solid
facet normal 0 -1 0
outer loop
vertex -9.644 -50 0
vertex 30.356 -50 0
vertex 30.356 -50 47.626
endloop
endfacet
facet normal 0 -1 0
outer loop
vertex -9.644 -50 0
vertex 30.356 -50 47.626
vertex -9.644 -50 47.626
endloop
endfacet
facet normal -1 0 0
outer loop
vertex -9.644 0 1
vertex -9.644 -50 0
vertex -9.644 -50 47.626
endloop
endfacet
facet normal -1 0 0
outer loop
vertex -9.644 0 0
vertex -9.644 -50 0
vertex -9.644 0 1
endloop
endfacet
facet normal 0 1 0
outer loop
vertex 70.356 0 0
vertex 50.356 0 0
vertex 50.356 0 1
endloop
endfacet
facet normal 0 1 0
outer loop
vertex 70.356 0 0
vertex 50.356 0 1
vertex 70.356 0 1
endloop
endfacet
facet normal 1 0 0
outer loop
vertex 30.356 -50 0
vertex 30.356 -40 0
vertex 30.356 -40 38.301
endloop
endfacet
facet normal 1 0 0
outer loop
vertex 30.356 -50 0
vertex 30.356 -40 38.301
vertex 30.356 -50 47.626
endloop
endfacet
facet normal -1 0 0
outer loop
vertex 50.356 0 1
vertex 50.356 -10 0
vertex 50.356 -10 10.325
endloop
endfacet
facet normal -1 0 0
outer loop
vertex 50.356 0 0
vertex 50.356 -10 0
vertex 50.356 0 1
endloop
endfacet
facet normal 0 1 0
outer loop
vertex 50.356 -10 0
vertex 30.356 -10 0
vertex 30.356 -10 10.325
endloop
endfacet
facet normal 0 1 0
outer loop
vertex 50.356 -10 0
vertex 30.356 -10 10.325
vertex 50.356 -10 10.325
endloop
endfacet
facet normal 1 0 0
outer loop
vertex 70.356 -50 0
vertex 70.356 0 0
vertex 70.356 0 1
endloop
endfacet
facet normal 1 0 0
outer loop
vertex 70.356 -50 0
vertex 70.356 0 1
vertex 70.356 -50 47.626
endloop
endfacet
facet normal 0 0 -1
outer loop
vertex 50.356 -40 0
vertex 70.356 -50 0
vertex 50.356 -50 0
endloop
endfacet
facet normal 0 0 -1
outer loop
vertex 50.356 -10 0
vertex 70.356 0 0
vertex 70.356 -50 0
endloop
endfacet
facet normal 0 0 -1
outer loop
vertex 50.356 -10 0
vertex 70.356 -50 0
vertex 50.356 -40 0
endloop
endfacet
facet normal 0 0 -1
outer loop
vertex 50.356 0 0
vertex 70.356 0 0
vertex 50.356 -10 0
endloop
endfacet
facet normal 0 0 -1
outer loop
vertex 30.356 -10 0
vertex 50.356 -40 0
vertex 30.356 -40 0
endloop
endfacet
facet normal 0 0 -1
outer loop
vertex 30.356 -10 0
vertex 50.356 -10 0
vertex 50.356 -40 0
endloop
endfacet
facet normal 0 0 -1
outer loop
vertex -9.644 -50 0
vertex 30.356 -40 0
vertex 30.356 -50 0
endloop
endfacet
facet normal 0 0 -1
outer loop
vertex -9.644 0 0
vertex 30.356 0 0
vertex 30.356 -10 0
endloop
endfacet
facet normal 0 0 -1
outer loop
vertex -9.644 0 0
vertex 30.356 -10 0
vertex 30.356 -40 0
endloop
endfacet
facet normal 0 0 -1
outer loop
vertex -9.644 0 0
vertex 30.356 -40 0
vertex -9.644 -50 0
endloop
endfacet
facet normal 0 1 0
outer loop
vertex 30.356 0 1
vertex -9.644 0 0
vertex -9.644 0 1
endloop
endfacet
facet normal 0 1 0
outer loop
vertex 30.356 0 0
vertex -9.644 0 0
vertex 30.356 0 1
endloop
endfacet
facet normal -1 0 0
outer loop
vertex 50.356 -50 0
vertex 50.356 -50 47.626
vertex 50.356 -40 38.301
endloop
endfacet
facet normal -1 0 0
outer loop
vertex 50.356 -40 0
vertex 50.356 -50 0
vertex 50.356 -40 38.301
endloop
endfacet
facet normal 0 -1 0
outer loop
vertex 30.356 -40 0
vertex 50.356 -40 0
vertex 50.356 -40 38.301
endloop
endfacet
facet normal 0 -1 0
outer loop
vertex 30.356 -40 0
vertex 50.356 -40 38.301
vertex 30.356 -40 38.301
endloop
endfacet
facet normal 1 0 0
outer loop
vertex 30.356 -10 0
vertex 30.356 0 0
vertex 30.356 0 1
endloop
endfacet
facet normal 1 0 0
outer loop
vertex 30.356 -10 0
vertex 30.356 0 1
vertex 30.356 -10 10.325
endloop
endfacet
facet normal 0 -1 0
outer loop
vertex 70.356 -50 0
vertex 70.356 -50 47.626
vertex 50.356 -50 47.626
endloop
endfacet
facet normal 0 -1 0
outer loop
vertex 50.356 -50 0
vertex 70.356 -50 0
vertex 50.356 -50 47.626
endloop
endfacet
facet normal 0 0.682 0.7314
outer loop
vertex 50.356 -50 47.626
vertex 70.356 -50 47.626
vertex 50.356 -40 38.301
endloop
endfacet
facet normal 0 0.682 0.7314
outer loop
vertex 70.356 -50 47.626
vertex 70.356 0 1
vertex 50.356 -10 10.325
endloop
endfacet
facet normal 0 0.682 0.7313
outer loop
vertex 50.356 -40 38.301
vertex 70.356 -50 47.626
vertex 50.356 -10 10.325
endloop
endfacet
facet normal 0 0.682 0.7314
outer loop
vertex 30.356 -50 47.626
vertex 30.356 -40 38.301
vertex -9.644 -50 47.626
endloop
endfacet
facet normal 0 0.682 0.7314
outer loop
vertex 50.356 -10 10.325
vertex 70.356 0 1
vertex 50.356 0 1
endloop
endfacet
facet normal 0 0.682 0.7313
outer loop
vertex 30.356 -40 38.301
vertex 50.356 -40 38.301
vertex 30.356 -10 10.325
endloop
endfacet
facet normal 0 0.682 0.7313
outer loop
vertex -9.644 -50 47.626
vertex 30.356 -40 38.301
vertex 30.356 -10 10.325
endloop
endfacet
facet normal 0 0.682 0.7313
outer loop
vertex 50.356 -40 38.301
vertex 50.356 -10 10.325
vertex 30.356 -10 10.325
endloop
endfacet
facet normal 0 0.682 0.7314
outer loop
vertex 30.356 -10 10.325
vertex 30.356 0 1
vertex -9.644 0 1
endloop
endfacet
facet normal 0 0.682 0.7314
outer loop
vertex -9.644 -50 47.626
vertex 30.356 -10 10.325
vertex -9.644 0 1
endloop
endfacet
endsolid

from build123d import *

# Parameters (mm, degrees)
EXTRUDE_1_DEPTH = 1
DRAFT_5_ANGLE   = 43


with BuildPart() as part:
    # 草图1 → 凸台-拉伸1 (new body)
    with BuildSketch(Plane.XY):
        Polygon((-9.644281244, 0), (30.355718756, 0), (30.355718756, -10), (50.355718756, -10), (50.355718756, 0), (70.355718756, 0), (70.355718756, -50), (50.355718756, -50), (50.355718756, -40), (30.355718756, -40), (30.355718756, -50), (-9.644281244, -50), align=None)
    extrude(amount=EXTRUDE_1_DEPTH)

    # 拔模5
    draft_5_faces = [part.faces().sort_by_distance(p)[0] for p in [
        (29.244607645, -25, 1),
    ]]
    draft(draft_5_faces, Plane(origin=(-9.644281244, 0, 1), x_dir=(1, 0, 0), z_dir=(0, 1, 0)), DRAFT_5_ANGLE)


solid = part.part
